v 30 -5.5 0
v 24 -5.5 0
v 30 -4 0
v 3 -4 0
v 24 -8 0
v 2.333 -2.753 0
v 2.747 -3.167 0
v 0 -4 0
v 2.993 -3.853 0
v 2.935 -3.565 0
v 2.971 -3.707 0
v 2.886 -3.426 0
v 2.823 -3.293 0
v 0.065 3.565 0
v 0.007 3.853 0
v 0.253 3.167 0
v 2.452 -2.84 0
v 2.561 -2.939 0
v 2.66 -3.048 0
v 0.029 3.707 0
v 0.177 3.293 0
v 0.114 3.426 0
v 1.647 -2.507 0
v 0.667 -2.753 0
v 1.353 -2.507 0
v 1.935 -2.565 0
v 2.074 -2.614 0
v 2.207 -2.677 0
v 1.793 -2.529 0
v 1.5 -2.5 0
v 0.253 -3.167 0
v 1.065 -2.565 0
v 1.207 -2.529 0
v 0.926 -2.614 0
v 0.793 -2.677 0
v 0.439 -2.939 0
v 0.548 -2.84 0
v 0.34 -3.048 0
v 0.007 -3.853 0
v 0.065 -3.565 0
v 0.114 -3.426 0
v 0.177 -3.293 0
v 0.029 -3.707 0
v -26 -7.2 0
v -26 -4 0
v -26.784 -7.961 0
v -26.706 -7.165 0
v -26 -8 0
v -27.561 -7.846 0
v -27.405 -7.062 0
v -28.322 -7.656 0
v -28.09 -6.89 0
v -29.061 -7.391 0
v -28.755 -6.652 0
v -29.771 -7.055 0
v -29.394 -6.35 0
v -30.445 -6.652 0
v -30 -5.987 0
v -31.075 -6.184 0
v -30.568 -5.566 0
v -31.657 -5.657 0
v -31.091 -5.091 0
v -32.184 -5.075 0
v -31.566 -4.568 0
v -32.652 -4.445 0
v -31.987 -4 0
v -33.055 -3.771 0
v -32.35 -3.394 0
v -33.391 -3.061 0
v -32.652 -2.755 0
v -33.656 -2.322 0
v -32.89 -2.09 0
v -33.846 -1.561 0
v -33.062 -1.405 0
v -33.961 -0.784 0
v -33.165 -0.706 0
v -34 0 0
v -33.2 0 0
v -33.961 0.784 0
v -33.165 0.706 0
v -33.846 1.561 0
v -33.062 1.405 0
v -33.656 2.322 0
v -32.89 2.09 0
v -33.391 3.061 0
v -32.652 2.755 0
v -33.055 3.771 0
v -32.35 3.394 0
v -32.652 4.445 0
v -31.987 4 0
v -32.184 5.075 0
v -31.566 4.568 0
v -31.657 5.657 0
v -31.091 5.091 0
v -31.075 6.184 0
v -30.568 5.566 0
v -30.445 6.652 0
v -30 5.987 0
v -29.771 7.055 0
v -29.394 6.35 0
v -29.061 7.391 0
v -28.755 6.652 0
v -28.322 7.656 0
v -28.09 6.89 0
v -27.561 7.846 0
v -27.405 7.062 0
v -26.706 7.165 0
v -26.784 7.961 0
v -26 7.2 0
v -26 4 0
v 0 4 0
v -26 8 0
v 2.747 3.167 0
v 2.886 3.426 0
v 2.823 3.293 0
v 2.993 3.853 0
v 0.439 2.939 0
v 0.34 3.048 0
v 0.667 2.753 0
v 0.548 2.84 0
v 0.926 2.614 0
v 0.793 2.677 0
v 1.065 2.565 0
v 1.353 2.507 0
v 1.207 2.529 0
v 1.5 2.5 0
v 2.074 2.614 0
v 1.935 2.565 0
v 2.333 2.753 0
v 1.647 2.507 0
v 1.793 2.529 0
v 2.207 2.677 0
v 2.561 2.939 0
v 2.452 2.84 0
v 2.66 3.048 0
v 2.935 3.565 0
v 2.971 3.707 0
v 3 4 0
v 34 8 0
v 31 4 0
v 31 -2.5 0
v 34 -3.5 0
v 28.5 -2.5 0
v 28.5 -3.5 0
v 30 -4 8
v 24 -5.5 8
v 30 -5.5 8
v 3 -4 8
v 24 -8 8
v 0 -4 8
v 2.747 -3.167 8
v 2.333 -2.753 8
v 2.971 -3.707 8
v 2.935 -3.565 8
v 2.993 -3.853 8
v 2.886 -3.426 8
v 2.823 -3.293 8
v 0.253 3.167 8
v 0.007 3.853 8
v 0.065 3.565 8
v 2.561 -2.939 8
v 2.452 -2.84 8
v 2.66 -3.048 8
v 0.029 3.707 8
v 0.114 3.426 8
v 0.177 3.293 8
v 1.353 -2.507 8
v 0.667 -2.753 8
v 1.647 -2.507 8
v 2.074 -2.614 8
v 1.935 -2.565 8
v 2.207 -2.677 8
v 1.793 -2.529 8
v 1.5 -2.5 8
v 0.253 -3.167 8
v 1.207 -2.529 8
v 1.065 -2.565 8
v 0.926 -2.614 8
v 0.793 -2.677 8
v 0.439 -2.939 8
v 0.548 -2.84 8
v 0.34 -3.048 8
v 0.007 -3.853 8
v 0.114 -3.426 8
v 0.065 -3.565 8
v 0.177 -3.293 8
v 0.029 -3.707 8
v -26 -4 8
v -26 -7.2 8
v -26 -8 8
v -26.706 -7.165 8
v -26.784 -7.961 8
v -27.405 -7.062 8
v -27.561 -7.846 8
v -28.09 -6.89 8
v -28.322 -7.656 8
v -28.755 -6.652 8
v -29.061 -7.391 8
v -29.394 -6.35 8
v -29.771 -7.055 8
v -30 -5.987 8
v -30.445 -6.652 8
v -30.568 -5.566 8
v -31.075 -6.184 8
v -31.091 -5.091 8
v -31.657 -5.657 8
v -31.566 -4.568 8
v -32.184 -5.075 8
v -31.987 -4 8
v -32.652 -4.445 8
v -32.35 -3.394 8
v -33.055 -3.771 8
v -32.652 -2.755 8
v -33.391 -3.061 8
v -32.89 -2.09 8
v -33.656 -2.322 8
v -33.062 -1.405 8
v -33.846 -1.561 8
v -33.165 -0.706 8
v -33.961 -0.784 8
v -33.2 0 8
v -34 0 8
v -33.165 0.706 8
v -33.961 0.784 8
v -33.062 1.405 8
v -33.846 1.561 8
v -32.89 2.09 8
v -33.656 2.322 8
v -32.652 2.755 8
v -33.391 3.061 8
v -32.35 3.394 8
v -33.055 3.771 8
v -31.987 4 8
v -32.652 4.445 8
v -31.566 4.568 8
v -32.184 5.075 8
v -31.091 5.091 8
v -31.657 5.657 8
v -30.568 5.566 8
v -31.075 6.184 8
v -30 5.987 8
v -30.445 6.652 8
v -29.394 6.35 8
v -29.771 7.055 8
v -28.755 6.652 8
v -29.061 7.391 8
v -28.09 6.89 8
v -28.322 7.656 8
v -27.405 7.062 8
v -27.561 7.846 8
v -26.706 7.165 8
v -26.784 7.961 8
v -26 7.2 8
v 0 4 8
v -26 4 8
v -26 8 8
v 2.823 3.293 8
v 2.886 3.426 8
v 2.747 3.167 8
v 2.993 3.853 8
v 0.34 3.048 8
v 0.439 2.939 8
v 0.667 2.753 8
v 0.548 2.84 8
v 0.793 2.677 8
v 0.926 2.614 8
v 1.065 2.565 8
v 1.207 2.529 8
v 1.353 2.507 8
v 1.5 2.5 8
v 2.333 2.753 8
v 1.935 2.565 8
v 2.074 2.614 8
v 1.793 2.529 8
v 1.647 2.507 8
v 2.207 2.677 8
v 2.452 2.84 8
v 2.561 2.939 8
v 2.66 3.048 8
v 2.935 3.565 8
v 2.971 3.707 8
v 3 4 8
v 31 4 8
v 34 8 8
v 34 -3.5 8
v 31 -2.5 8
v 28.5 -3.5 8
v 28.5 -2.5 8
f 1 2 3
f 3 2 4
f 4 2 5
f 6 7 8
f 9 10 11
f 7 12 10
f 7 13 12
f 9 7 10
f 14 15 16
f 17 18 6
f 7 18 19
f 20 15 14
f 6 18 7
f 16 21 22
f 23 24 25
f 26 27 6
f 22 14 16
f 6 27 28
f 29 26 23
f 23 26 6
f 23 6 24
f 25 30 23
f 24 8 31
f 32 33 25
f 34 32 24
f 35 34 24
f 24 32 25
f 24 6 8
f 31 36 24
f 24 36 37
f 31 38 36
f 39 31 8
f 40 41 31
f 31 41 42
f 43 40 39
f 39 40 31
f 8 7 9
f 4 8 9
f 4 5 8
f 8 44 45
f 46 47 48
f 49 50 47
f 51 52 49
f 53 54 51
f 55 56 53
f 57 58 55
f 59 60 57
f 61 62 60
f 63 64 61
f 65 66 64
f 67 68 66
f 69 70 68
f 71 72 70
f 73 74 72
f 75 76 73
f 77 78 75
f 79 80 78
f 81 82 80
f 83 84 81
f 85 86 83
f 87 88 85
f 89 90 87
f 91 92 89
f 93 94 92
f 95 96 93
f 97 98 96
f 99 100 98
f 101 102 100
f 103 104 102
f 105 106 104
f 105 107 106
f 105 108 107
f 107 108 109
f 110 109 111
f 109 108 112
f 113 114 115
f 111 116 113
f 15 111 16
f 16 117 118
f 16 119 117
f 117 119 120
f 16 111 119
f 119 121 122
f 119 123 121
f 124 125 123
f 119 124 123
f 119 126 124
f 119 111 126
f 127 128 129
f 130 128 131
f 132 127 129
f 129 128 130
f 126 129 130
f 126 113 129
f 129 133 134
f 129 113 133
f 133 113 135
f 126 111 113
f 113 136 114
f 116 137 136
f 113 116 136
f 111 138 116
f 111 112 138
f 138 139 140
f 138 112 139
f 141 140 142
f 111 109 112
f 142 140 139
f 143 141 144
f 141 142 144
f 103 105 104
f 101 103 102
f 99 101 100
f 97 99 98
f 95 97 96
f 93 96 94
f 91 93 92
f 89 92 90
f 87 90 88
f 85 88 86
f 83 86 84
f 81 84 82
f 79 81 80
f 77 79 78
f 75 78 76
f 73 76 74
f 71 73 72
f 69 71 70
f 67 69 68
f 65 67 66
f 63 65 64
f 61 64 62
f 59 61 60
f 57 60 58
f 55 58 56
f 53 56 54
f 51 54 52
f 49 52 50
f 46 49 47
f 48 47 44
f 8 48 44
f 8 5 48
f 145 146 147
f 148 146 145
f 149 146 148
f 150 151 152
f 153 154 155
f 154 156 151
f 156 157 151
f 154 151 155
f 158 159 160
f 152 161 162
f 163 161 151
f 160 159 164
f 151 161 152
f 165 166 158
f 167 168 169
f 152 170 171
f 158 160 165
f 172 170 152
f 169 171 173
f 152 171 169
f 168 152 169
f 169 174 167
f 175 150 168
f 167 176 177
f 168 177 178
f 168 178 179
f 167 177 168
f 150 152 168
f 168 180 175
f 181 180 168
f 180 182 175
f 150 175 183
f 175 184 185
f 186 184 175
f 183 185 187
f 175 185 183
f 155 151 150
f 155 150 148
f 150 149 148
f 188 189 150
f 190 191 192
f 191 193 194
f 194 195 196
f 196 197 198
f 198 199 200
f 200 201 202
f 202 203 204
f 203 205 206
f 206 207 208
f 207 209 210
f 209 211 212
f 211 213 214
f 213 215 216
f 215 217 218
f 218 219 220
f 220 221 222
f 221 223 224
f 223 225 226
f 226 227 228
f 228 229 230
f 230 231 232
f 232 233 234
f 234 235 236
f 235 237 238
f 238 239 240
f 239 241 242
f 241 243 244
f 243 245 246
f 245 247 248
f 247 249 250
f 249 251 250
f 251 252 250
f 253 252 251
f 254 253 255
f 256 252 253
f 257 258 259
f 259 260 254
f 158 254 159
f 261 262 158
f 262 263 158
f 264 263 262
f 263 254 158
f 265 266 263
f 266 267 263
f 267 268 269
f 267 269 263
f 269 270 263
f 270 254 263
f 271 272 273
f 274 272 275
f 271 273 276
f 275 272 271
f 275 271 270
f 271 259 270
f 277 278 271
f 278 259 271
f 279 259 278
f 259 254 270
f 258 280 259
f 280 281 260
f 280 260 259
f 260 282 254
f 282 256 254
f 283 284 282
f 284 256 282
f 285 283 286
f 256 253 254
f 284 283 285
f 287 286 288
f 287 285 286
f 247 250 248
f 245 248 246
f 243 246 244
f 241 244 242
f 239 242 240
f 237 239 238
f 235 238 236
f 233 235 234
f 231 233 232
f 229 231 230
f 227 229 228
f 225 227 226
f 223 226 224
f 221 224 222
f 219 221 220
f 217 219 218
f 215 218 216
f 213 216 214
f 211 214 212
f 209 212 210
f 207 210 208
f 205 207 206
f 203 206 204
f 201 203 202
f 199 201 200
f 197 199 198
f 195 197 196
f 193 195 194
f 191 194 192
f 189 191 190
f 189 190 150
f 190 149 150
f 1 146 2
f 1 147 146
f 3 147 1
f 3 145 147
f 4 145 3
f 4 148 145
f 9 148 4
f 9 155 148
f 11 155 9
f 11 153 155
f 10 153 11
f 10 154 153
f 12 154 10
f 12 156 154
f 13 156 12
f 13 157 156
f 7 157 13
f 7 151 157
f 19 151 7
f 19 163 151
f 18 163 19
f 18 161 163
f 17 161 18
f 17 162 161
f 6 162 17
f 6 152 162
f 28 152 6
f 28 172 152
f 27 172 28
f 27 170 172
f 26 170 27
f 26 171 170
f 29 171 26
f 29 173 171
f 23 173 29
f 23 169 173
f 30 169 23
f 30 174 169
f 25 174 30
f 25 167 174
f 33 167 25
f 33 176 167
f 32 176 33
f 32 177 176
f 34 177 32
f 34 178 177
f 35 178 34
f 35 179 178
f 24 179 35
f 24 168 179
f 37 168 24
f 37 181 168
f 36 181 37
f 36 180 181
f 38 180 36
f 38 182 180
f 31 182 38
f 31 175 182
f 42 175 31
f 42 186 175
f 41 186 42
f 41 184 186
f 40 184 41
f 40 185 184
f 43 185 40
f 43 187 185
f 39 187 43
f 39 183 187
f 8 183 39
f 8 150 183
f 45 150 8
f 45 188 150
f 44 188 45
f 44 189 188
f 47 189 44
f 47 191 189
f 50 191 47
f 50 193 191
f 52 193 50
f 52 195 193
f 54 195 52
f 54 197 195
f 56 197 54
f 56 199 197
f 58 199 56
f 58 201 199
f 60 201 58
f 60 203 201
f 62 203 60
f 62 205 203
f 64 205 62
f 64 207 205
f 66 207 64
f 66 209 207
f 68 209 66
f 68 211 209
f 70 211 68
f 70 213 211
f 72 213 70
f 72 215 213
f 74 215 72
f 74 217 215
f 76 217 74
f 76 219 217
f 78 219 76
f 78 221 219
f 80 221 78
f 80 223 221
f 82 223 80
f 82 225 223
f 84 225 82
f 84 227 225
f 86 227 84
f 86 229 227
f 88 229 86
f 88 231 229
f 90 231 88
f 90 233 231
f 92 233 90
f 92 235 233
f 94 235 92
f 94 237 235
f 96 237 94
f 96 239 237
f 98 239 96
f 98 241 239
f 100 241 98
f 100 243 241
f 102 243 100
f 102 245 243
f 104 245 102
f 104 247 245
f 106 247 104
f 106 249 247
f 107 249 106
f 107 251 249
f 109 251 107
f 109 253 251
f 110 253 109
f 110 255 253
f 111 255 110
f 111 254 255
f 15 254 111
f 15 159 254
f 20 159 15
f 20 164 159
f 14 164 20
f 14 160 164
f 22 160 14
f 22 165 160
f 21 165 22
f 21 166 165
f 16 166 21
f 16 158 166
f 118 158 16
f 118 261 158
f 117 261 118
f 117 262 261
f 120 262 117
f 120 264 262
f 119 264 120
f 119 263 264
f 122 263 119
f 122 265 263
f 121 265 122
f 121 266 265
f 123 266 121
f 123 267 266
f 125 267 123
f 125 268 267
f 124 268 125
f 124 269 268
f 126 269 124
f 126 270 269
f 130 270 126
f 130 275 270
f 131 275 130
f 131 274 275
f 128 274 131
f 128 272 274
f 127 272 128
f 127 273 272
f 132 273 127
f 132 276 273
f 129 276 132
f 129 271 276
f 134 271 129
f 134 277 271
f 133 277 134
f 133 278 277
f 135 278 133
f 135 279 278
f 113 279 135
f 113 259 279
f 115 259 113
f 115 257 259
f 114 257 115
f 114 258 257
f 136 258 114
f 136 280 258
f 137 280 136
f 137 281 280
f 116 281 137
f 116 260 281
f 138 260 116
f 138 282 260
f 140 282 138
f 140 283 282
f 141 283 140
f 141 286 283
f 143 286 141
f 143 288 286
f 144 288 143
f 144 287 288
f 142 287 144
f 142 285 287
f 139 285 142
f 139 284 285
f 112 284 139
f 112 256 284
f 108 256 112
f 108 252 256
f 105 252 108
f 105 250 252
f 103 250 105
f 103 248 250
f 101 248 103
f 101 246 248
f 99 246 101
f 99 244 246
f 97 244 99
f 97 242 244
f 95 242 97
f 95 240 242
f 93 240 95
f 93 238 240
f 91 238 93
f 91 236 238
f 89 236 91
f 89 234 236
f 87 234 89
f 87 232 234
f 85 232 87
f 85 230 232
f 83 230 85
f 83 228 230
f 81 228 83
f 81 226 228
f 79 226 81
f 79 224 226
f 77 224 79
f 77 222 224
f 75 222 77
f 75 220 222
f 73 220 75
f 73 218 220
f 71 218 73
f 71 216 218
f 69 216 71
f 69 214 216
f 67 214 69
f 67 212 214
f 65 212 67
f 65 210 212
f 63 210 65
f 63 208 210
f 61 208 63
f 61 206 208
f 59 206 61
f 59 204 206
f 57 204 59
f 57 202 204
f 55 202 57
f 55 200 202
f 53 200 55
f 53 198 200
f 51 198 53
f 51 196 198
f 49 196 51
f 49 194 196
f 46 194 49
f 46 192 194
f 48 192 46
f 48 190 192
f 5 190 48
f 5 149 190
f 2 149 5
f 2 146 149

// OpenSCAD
// Pinch clamp for silicone tubing (up to 6.4 mm across)
// Printed flat: 2-D profile in XY, extruded 8 mm along Z.
// Rests on XY plane at z = 0, builds upward (+Z). Centred on origin in X and Y.

$fn = 64;

// ---- Global dimensions (mm) ----
extrude_h   = 8;    // print thickness along Z

// Lower jaw
lower_bar_x0 = 0;   // left end of lower bar
lower_bar_x1 = 50;  // right end of lower bar (start of tongue)
lower_bar_y0 = 0;   // bottom face of lower bar
lower_bar_y1 = 4;   // top face of lower bar
lower_tongue_x0 = 50; // left end of tongue
lower_tongue_x1 = 56; // right end of tongue
lower_tongue_y0 = 2.5; // bottom face of tongue
lower_tongue_y1 = 4;   // top face of tongue

// Upper jaw
upper_bar_x0 = 0;   // left end of upper bar
upper_bar_x1 = 60;  // right end of upper bar
upper_bar_y0 = 12;  // bottom face of upper bar
upper_bar_y1 = 16;  // top face of upper bar

// Living hinge (half-ring on x < 0 side, centred at (0, 8))
hinge_cx = 0;
hinge_cy = 8;
hinge_r_inner = 7.2; // inner radius
hinge_r_outer = 8.0; // outer radius (0.8 mm thick)

// Pinch ridges (half-round, 1.5 mm radius, on inner faces at x = 27.5)
ridge_x = 27.5;
ridge_r = 1.5;
lower_ridge_cy = 4;  // centred on lower jaw inner face (y = 4)
upper_ridge_cy = 12; // centred on upper jaw inner face (y = 12)

// Snap latch (hangs from upper jaw right end)
latch_leg_x0 = 57;   // left end of latch leg
latch_leg_x1 = 60;   // right end of latch leg
latch_leg_y0 = 4.5;  // bottom face of latch leg
latch_leg_y1 = 12;   // top face of latch leg (meets upper bar bottom)
latch_nose_x0 = 54.5; // left end of nose
latch_nose_x1 = 57;   // right end of nose
latch_nose_y0 = 4.5;  // bottom face of nose
latch_nose_y1 = 5.5;  // top face of nose (0.5 mm above tongue top at y = 5)

// ---- 2-D profile pieces (in XY plane) ----

// Lower jaw: bar + tongue
module lower_profile() { union() {
    translate([lower_bar_x0, lower_bar_y0])
        square([lower_bar_x1 - lower_bar_x0, lower_bar_y1 - lower_bar_y0],
               center = [false, false]);
    translate([lower_tongue_x0, lower_tongue_y0])
        square([lower_tongue_x1 - lower_tongue_x0, lower_tongue_y1 - lower_tongue_y0],
               center = [false, false]);
} }

// Upper jaw: bar
module upper_profile() {
    translate([upper_bar_x0, upper_bar_y0])
        square([upper_bar_x1 - upper_bar_x0, upper_bar_y1 - upper_bar_y0],
               center = [false, false]);
}

// Hinge: half-ring on x < 0 side (left half of annulus centred at (0, 8))
module hinge_half() {
    intersection() {
        difference() {
            translate([hinge_cx, hinge_cy])
                circle(d = hinge_r_outer * 2, $fn = $fn);
            translate([hinge_cx, hinge_cy])
                circle(d = hinge_r_inner * 2, $fn = $fn);
        }
        // Half-plane x <= 0 (covers the left half of the annulus)
        translate([-100, -100])
            square([100, 200], center = [false, false]);
    }
}

// Lower pinch ridge: half-circle bulging into the gap (y > 4 side)
module lower_ridge() {
    intersection() {
        translate([ridge_x, lower_ridge_cy])
            circle(d = ridge_r * 2, $fn = $fn);
        // Half-plane y >= 4
        translate([ridge_x - 100, lower_ridge_cy])
            square([200, 100], center = [false, false]);
    }
}

// Upper pinch ridge: half-circle bulging into the gap (y < 12 side)
module upper_ridge() {
    intersection() {
        translate([ridge_x, upper_ridge_cy])
            circle(d = ridge_r * 2, $fn = $fn);
        // Half-plane y <= 12
        translate([ridge_x - 100, upper_ridge_cy - 100])
            square([200, 100], center = [false, false]);
    }
}

// Latch leg
module latch_leg() {
    translate([latch_leg_x0, latch_leg_y0])
        square([latch_leg_x1 - latch_leg_x0, latch_leg_y1 - latch_leg_y0],
               center = [false, false]);
}

// Latch nose
module latch_nose() {
    translate([latch_nose_x0, latch_nose_y0])
        square([latch_nose_x1 - latch_nose_x0, latch_nose_y1 - latch_nose_y0],
               center = [false, false]);
}

// ---- Assemble 2-D profile ----
module profile() { union() {
    lower_profile();
    upper_profile();
    hinge_half();
    lower_ridge();
    upper_ridge();
    latch_leg();
    latch_nose();
} }

// ---- Extrude and centre on origin in X and Y ----
// Bounding box of the profile:
// x_min = -hinge_r_outer (leftmost point of hinge)
// x_max = upper_bar_x1 (rightmost point of upper bar / latch leg)
// y_min = lower_bar_y0
// y_max = upper_bar_y1
x_min = -hinge_r_outer;
x_max = upper_bar_x1;
y_min = lower_bar_y0;
y_max = upper_bar_y1;

translate([-(x_min + x_max) / 2, -(y_min + y_max) / 2, 0])
    linear_extrude(height = extrude_h, center = false)
        profile();
